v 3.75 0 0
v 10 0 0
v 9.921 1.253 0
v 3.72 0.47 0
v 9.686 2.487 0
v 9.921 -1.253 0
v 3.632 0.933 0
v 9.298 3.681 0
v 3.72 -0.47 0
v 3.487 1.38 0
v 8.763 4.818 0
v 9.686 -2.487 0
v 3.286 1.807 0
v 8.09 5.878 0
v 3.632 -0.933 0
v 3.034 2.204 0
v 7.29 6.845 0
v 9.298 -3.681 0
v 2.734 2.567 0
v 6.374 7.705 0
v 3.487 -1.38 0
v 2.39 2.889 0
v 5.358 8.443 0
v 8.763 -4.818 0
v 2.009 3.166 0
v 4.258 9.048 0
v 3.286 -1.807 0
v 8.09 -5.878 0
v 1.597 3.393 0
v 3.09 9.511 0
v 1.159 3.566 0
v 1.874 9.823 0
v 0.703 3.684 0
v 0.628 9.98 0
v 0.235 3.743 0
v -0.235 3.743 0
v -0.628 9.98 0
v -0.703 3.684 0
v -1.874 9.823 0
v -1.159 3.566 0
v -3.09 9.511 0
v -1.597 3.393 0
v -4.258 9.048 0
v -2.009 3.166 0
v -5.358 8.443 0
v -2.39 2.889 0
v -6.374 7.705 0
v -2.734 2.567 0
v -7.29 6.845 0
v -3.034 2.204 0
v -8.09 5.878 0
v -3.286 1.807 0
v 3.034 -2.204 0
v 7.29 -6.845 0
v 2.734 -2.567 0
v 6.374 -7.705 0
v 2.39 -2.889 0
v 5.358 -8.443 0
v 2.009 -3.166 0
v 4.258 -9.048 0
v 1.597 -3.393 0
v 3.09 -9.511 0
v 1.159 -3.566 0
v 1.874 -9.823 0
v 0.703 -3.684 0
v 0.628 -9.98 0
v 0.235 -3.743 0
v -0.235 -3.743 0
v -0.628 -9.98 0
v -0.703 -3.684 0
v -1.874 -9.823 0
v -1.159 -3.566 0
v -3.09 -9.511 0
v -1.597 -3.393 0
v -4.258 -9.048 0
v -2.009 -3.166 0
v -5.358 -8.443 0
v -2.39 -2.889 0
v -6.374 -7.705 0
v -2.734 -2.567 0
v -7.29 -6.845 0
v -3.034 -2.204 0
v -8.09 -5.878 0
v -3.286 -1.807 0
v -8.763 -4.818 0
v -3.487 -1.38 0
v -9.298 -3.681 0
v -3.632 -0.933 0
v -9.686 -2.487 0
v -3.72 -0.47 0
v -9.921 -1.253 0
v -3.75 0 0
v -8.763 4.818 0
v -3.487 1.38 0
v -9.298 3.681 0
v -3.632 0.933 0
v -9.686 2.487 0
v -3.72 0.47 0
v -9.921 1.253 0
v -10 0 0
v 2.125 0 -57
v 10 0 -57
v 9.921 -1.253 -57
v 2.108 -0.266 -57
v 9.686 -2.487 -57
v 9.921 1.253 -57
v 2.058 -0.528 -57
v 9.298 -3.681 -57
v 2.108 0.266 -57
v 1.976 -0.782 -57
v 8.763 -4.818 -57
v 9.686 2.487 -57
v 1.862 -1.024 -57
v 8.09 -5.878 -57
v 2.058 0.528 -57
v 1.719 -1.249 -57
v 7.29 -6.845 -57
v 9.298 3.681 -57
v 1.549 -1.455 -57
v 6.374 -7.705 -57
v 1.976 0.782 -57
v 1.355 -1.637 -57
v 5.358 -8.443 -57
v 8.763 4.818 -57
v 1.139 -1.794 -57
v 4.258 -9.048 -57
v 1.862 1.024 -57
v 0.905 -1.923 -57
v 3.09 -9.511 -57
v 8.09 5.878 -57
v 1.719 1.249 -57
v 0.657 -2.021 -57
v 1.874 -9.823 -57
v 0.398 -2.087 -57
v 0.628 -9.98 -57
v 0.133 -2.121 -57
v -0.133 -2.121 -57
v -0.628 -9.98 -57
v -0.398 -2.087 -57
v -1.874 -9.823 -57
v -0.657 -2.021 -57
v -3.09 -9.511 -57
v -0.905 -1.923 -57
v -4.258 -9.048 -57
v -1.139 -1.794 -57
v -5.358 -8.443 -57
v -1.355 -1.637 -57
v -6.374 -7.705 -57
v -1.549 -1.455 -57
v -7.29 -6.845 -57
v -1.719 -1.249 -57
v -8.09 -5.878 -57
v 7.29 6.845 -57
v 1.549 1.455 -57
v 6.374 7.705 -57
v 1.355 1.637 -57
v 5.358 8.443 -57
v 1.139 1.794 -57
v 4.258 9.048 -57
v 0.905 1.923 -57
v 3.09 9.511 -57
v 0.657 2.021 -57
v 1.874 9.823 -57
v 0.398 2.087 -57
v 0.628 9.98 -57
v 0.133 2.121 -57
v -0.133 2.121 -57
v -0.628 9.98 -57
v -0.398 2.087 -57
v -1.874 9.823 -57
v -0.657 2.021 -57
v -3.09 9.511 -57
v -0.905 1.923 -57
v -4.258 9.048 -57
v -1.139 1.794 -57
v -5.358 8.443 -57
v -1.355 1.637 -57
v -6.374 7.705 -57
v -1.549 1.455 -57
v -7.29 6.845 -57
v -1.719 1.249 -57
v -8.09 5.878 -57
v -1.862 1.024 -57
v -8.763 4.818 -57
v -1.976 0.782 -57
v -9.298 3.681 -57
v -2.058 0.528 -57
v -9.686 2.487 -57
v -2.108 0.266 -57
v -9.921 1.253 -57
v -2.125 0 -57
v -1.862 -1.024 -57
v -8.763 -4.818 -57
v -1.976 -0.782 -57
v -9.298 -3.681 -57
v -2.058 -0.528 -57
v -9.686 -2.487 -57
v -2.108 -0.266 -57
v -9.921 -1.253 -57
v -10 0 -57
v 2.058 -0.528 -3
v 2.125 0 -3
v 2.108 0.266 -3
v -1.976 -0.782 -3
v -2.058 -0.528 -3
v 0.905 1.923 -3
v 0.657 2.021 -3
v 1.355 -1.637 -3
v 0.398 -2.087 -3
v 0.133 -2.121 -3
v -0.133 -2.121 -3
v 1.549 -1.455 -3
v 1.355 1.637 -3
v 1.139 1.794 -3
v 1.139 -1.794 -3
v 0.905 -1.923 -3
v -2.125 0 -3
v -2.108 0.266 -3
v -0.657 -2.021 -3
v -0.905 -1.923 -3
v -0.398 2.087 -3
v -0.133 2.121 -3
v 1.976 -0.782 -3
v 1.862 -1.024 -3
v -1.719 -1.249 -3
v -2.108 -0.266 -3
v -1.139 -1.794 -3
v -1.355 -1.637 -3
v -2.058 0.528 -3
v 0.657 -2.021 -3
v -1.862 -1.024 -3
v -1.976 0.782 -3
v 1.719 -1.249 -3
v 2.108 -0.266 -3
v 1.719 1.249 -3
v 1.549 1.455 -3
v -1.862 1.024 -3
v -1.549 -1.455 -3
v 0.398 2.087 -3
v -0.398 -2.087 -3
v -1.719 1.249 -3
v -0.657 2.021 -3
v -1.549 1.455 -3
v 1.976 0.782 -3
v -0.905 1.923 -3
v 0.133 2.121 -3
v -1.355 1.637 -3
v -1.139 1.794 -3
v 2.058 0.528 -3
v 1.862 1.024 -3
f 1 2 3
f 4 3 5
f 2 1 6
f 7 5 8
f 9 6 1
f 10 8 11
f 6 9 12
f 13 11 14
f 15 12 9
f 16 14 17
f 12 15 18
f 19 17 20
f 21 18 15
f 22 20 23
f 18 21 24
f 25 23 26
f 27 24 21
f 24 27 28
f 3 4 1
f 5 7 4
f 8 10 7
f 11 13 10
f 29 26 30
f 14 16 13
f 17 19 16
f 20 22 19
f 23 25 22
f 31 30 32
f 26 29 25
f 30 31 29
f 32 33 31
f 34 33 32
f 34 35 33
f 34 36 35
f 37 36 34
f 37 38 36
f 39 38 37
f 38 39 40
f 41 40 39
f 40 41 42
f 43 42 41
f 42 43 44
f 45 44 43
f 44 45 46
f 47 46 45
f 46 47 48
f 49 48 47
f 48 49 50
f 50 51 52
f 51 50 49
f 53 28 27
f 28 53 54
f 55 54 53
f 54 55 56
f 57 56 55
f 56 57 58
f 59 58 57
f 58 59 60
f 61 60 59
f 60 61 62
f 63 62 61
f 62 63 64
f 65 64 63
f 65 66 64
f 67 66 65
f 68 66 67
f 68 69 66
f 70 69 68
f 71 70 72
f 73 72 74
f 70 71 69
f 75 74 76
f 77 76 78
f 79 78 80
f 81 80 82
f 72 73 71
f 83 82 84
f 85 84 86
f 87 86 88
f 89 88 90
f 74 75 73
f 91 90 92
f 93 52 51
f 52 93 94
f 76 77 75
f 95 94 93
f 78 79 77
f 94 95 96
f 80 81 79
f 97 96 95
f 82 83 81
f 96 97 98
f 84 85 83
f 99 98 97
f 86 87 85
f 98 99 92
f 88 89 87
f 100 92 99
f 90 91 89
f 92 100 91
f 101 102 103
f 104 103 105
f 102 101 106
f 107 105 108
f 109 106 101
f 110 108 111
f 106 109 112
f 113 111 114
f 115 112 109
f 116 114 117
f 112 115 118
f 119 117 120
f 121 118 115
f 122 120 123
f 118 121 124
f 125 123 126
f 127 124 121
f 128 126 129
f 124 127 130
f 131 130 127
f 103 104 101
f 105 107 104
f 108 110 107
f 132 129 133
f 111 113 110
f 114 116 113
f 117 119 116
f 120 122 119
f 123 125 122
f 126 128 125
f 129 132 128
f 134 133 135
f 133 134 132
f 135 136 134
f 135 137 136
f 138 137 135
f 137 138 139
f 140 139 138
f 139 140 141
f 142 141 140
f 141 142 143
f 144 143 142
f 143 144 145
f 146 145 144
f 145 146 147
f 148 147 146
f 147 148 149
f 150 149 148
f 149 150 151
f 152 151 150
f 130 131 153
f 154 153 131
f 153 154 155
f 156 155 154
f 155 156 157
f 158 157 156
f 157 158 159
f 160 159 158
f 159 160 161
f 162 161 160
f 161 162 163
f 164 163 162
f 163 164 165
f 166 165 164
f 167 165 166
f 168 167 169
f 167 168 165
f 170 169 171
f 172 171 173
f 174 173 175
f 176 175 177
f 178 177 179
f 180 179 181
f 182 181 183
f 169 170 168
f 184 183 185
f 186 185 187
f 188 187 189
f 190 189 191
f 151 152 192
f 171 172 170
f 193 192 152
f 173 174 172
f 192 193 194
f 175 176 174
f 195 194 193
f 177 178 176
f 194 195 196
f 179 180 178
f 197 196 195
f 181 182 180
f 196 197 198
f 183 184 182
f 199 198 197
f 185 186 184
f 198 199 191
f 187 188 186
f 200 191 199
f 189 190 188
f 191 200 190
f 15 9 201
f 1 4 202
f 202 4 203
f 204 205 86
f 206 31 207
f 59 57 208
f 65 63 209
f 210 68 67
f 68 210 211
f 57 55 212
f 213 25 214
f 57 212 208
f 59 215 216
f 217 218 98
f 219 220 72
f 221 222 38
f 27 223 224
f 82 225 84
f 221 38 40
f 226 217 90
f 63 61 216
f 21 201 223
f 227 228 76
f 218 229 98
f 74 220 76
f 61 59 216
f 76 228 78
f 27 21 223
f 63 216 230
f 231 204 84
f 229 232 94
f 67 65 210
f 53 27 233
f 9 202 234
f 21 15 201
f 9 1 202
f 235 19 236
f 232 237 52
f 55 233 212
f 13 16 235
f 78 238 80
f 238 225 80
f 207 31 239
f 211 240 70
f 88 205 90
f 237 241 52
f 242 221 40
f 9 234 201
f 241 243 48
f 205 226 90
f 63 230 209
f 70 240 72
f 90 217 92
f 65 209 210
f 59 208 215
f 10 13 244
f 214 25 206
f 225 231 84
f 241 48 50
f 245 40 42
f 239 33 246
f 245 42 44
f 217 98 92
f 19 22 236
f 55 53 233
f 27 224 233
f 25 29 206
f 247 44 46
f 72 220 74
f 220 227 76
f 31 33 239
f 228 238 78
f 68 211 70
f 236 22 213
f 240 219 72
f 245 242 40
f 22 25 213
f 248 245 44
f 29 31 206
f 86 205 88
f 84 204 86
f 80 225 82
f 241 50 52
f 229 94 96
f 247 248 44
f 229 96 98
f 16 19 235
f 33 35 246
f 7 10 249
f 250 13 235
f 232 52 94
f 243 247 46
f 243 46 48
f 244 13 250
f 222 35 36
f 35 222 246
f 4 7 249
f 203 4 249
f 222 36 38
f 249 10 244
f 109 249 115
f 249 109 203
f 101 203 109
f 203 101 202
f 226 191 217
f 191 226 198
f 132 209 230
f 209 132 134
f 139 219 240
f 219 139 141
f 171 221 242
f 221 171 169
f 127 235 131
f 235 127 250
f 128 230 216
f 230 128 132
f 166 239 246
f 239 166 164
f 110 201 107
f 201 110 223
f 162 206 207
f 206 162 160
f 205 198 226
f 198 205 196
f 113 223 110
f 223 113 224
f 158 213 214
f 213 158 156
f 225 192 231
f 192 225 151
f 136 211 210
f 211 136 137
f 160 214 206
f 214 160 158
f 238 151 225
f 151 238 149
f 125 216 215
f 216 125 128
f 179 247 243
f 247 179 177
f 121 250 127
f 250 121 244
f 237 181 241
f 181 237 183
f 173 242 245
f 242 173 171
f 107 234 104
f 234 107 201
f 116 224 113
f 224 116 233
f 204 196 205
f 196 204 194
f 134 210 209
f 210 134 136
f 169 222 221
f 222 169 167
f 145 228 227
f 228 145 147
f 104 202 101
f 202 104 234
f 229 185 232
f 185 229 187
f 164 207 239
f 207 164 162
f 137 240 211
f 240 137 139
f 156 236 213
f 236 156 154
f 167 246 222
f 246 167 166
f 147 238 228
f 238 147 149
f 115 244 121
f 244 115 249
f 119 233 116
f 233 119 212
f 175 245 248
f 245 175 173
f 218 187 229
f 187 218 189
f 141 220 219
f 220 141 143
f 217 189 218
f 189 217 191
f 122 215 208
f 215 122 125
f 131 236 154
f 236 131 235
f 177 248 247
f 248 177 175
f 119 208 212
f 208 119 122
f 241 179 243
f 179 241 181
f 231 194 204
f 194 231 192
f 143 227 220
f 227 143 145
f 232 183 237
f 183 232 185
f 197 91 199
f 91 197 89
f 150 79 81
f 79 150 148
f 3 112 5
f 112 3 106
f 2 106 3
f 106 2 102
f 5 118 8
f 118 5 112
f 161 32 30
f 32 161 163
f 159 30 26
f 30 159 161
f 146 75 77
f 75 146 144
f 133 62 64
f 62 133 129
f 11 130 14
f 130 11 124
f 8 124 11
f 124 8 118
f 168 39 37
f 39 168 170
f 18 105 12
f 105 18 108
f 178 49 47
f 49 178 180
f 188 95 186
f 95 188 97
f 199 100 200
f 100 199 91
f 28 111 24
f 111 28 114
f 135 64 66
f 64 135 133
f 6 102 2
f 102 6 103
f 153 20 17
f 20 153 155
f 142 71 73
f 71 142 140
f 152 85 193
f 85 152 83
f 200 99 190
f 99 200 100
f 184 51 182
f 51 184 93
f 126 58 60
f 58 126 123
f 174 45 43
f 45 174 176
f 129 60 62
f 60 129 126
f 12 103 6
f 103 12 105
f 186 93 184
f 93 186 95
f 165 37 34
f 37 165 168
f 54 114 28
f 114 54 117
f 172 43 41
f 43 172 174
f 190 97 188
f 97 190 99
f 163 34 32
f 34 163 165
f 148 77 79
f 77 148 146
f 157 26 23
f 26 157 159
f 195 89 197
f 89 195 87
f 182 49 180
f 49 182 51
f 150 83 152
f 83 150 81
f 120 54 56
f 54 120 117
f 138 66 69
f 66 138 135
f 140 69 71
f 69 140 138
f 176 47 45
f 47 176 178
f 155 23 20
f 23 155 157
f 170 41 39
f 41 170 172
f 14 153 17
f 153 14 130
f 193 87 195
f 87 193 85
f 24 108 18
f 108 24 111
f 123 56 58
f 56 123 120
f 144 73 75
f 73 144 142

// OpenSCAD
$fn = 50;


difference() {
	union() {
		translate(v = [0, 0, -57.0000000000]) {
			cylinder(h = 57, r = 10.0000000000);
		}
		cylinder(h = 0, r = 20.0000000000);
	}
	union() {
		translate(v = [0, 0, 0]) {
			rotate(a = [0, 0, 0]) {
				difference() {
					union() {
						#translate(v = [0, 0, -57.0000000000]) {
							cylinder(h = 57, r = 2.0000000000);
						}
						#translate(v = [0, 0, -3]) {
							cylinder(h = 3, r = 10.0000000000, r1 = 2.1250000000, r2 = 3.7500000000);
						}
						#translate(v = [0, 0, -57.0000000000]) {
							cylinder(h = 57, r = 2.1250000000);
						}
						#translate(v = [0, 0, -57.0000000000]) {
							cylinder(h = 57, r = 2.0000000000);
						}
					}
					union();
				}
			}
		}
	}
}
